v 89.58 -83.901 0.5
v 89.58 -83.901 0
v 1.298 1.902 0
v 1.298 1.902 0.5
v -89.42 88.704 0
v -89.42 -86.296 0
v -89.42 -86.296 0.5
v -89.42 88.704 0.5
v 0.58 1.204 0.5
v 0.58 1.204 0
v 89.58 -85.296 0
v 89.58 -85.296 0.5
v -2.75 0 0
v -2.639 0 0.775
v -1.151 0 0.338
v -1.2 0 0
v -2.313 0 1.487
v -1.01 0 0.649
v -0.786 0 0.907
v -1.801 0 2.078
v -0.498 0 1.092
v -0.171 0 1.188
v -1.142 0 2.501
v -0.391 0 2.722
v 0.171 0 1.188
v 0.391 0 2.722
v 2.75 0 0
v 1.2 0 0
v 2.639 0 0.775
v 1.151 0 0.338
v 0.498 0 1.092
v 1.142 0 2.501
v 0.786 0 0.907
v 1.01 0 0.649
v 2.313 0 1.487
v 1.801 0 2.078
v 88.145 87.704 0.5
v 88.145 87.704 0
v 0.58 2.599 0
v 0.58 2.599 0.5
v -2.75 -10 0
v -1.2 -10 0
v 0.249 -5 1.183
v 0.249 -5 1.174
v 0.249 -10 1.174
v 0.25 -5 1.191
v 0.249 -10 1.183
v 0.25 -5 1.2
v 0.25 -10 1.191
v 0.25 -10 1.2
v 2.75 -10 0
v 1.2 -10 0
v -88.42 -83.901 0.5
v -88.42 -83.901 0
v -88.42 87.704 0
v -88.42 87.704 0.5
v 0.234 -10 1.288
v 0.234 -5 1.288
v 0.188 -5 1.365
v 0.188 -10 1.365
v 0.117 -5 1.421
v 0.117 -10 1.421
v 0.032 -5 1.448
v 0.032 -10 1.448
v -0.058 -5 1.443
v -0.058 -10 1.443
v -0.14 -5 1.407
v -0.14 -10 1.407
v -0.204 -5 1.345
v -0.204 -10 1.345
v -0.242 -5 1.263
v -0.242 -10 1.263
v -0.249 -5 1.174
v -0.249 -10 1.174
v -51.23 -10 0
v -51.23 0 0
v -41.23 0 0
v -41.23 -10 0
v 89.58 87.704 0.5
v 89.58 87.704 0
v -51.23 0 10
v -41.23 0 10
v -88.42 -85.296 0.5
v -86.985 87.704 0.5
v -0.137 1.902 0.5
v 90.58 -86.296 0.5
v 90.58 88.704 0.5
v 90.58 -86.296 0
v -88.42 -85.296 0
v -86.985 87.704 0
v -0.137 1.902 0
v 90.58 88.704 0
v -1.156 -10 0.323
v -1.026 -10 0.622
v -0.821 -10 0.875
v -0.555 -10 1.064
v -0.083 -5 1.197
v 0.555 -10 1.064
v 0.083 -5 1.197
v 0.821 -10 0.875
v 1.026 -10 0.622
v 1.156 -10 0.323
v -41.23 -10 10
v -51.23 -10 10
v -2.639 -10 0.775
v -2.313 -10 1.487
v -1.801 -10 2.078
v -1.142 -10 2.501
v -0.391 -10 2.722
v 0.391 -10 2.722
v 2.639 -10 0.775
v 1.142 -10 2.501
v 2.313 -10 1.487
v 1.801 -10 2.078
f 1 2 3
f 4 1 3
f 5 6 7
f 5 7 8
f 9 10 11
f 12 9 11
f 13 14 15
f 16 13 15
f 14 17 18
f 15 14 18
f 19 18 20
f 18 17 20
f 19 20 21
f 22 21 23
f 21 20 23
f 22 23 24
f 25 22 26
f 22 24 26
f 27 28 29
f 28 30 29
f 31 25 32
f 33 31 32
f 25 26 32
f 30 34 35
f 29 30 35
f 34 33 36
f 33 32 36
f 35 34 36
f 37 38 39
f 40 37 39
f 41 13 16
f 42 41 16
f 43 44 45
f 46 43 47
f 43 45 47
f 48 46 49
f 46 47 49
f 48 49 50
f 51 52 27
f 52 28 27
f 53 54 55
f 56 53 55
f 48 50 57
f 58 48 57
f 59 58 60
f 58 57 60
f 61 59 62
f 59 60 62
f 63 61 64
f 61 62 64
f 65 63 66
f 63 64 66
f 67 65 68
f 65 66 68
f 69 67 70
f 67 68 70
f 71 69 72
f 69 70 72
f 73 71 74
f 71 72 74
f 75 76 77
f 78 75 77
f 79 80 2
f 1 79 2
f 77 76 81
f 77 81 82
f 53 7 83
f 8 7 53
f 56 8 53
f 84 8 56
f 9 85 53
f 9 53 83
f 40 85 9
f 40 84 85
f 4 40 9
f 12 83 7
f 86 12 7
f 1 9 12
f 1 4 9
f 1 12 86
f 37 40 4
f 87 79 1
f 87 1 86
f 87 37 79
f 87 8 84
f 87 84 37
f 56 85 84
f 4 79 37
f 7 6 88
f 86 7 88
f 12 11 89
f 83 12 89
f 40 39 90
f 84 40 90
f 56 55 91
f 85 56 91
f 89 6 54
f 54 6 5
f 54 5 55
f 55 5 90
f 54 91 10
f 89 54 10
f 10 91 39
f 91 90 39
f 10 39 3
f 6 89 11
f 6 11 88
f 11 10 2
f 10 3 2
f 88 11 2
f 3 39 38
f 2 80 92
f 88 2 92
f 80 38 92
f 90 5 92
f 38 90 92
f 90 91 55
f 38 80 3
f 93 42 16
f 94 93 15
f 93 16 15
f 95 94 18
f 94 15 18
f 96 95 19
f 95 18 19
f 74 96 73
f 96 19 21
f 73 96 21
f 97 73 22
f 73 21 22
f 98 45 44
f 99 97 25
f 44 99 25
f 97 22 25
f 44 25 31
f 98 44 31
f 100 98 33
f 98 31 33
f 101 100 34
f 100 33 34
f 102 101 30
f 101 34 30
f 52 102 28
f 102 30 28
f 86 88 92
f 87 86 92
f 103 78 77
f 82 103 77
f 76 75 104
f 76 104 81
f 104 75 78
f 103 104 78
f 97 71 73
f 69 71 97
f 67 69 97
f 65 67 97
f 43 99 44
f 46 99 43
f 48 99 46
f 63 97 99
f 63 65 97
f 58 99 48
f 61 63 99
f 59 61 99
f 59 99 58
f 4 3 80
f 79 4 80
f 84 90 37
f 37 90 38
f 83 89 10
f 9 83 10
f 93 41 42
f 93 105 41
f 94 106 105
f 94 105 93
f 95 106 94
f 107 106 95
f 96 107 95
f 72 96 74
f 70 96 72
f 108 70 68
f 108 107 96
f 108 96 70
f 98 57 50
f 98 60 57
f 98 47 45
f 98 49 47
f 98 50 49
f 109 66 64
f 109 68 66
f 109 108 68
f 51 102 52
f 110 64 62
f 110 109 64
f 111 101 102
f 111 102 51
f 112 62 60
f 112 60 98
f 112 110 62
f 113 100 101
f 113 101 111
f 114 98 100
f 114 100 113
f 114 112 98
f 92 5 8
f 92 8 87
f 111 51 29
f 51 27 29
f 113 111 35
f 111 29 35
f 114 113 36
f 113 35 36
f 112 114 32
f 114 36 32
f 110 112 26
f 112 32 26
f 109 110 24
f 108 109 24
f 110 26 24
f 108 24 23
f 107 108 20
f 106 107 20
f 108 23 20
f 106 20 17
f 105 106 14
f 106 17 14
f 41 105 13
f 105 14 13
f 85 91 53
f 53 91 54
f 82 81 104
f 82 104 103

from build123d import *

# Parameters (mm, degrees)
F1_DEPTH = 5
F3_DEPTH = 5
F5_DEPTH = 5
F6_W     = 180
F6_H     = 175
F7_DEPTH = 0.5
F8_W     = 10
F8_H     = 10
F9_DEPTH = 10


with BuildPart() as f1:
    # F0 (on Front) → F1 (new body)
    with BuildSketch(Plane.XZ):
        with BuildLine():
            Line((1.2, 0), (2.75, 0))
            ThreePointArc((2.75, 0), (0, 2.75), (-2.75, 0))
            Line((-2.75, 0), (-1.2, 0))
            ThreePointArc((-1.2, 0), (0, 1.2), (1.2, 0))
        make_face()
    extrude(amount=F1_DEPTH)

    # F2 (on face) → F3 (join)
    with BuildSketch(Plane.XZ.offset(5)):
        with BuildLine():
            ThreePointArc((-1.2, 0), (0, 1.2), (1.2, 0))
            Line((1.2, 0), (2.75, 0))
            ThreePointArc((2.75, 0), (0, 2.75), (-2.75, 0))
            Line((-2.75, 0), (-1.2, 0))
        make_face()
    extrude(amount=F3_DEPTH)

    # F4 (on face) → F5 (cut)
    with BuildSketch(Plane.XZ.offset(10)):
        with BuildLine():
            ThreePointArc((0.24864, 1.173958), (0.24966, 1.186961), (0.25, 1.2))
            ThreePointArc((0.25, 1.2), (-0.013039, 1.44966), (-0.24864, 1.173958))
            ThreePointArc((-0.24864, 1.173958), (0, 1.2), (0.24864, 1.173958))
        make_face()
    extrude(amount=-F5_DEPTH, mode=Mode.SUBTRACT)


with BuildPart() as f7:
    # F6 (on Top) → F7 (new body)
    with BuildSketch(Plane.XY):
        with Locations((0.580216, 1.204267)):
            Rectangle(F6_W, F6_H)
        Polygon((89.580216, -85.295733), (-88.419784, -85.295733), (0.580216, 1.204267), align=None, mode=Mode.SUBTRACT)
        Polygon((-0.137182, 1.901514), (-88.419784, -83.90124), (-88.419784, 87.704267), align=None, mode=Mode.SUBTRACT)
        Polygon((0.580216, 2.59876), (-86.984988, 87.704267), (88.14542, 87.704267), align=None, mode=Mode.SUBTRACT)
        Polygon((89.580216, 87.704267), (89.580216, -83.90124), (1.297614, 1.901514), align=None, mode=Mode.SUBTRACT)
    extrude(amount=F7_DEPTH)


with BuildPart() as f9:
    # F8 (on Top) → F9 (new body)
    with BuildSketch(Plane.XY):
        with Locations((-46.230354, -5)):
            Rectangle(F8_W, F8_H)
    extrude(amount=F9_DEPTH)


solid = Compound([f1.part, f7.part, f9.part])
